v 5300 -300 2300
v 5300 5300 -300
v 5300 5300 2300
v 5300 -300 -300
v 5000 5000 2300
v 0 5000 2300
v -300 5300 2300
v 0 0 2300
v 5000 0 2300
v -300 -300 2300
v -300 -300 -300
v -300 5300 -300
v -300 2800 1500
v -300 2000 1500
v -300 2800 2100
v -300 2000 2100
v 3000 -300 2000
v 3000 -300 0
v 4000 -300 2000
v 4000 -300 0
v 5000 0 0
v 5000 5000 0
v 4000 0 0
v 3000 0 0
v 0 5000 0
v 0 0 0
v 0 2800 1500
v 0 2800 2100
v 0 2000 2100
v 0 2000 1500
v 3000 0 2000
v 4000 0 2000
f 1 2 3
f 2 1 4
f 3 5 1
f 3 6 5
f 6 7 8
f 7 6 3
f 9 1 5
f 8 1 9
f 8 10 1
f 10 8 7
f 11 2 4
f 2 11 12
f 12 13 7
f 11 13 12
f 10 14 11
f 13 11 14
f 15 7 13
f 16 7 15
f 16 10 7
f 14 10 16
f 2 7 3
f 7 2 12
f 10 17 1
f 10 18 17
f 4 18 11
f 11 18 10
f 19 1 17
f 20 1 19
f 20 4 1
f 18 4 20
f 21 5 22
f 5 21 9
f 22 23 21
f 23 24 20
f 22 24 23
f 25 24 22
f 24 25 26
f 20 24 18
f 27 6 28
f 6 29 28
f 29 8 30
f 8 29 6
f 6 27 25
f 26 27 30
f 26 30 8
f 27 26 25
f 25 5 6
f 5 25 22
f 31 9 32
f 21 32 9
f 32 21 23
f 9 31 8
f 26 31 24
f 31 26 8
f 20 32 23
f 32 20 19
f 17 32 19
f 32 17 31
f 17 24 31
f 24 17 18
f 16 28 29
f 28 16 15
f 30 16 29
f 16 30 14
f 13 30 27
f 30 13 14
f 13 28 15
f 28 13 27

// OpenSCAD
// file: table.scad
// table module

table_height    = 800;
table_width     = 1200;
table_length    = 600;
table_leg_width = 50;

// example rendering with above values
table(table_height,table_width,table_length,table_leg_width);


module table(height,
             width,
             length,
             leg_width)
{
    cutout_width    = width - 2*leg_width;
    cutout_height   = height - leg_width;
    
    difference(){
        // main frame
        cube([width, length, height]);
        
        // leg cutout
        translate([leg_width,0,0])
            cube([cutout_width, length, cutout_height]);
    }
}
// file: bed.scad
// bed module

bed_length              = 2020;
bed_width               = 1020;
bed_frame_height        = 30;

bed_leg_height          = 1520;
bed_leg_width           = 74;

bed_rim_height          = 500;
bed_rim_width           = 20;

bed_frame_bar_width     = 144;
bed_frame_bar_height    = 20;
bed_frame_bar_space     = 80;


// example render with above values
bed(bed_length,
    bed_width,
    bed_frame_height,
    bed_leg_height,
    bed_leg_width,
    bed_rim_height,
    bed_rim_width,
    bed_frame_bar_height,
    bed_frame_bar_width,
    bed_frame_bar_space
    );


module bed(length,
           width,
           frame_height,
           leg_height,
           leg_width,
           rim_height,
           rim_width,
           frame_bar_height,
           frame_bar_width,
           frame_bar_space){
               
    // calculate frame bar values
    frame_bar_length    = width;
    frame_bar_num       = floor((length - frame_bar_width)
                         /(frame_bar_width + frame_bar_space));
    
    frame_bar_space     = (((length - frame_bar_width)
                            %(frame_bar_width + frame_bar_space))
                           /frame_bar_num)
                          +frame_bar_space;
               
    // calculate leg values
    bed_leg_x   = bed_length - leg_width;
    bed_leg_y   = bed_width - leg_width;
    bed_leg_pos = [[0,0,0],
                   [bed_leg_x,0,0],
                   [bed_leg_x,bed_leg_y,0],
                   [0,bed_leg_y,0]];


    // legs
    color("red")
    for (i=bed_leg_pos){
        translate(i)
            cube([leg_width,leg_width,leg_height]);
    }

    
    // upper side cross bars
    for(i=[0,width-leg_width])
        translate([0,i,leg_height])
            cube([length,leg_width,leg_width]);

    // upper front/back crossbars
    for(i=[0,length-leg_width]){
        translate([i,leg_width,leg_height])
            cube([leg_width,width-2*leg_width,leg_width]);
    }
    
    // lower side crossbars
    translate([leg_width,width-leg_width,rim_height])
        cube([length-2*leg_width,leg_width,leg_width]);
    
    // lower front/back cross bars
    for(i=[0,length-leg_width]){
        translate([i,leg_width,rim_height])
            cube([leg_width,width-2*leg_width,leg_width]);
    }    



    // bed frame bars
    translate([0,0,leg_height+leg_width]) {
    
        // first frame bar
        cube([frame_bar_width, frame_bar_length, frame_bar_height]);
        
        
        // remaining frame bars
        for(i=[0:1:frame_bar_num]){
            translate([i*(frame_bar_width+frame_bar_space),0,0])
                cube([frame_bar_width, frame_bar_length, frame_bar_height]);
        }
    }
    
    /*color("blue")
    translate([0,0,bed_leg_height])
        cube([length,width,frame_height]);
    */ 
    // side rims
    #for(i=[-rim_width, width])
        translate([0,i,leg_height])
            cube([length,rim_width,rim_height]);
    
    // front/back rims
    #for(i=[-rim_width, length])
        translate([i,-rim_width,leg_height])
            cube([rim_width,width + 2*rim_width,rim_height]);
    
    // output materials
    echo("Legs:\t\t 4x: ", h=leg_width, w=leg_width, l=leg_height);
    echo("Upper crossbars side:\t 2x: ", h=leg_width, w=leg_width, l=length);
    echo("Lower crossbars side:\t 1x: ", h=leg_width, w=leg_width, l=length-2*leg_width);
    echo("Crossbars f/b:\t 4x: ", h=leg_width, w=leg_width, h=width-2*leg_width);
    echo();
    echo("Total length\t ", 4*leg_height
                          + 2*length
                          + length-2*leg_width
                          + 4*(width-2*leg_width));
    echo("Rims side\t 2x: ", h=rim_width, w=rim_height, l=length);
    echo("Rims front/back\t 2x: ", h=rim_width, w=rim_height, l=width + 2*rim_width);
    echo("Frame bars\t ", num=frame_bar_num + 1, h=frame_bar_height, w=frame_bar_width, l=frame_bar_length);
    echo("Frame bar space\t ",frame_bar_space);
}
// file: rack.scad
// rack module

rack_shelf_number   = 3;

// overall rack dimensions
rack_length         = 750;
rack_width          = 300;
rack_height         = 1500;

// values required to calculate shelfes
rack_bar_width      = 50;  // side bar/wall width
rack_board_height   = 50;  // height of single inlay boards
rack_floor_space    = 70; // free space below lowest board


// rendering with examples from above
rack(rack_shelf_number,
     rack_length,
     rack_width,
     rack_height,
     rack_bar_width,
     rack_board_height,
     rack_floor_space);


module rack(shelf_number,
            length,
            width,
            height,
            bar_width=50,
            board_height=50,
            floor_space=50){

    shelf_length   = length - 2 * bar_width;
    shelf_height   = (height - floor_space - board_height
                          - shelf_number * board_height)
                          / shelf_number - 1;
    shelf_offset   = shelf_height + board_height;

    difference(){
        // main frame
        cube([length,width,height]);
        
        // cutouts for shelfes
        translate([0,0,floor_space + board_height])
            for(i=[0:1:shelf_number - 1]) {
                echo(i * shelf_offset);
                translate([bar_width,0,i * shelf_offset])
                    cube([shelf_length,width,shelf_height]);
        }
    }
}
// main file
// room plan

use <rack.scad>;
use <bed.scad>;
use <table.scad>;


room_dim    = [5000,5000,2300];
wall        = 300;

door_height = 2000;
door_width  = 1000;
door_offset = 3000;

window_height   = 600;
window_width    = 800;
window_offset_z = 1500;
window_offset_x = 2000;

// room
difference(){
    translate([-wall,-wall,-wall])
        // room + walls
        cube(room_dim+[2*wall,2*wall,wall]);
    
        // room inside
        cube(room_dim);
    
        // door
        translate([door_offset,-wall,0])
            cube([door_width,wall,door_height]);
    
        // window
        translate([0,window_offset_x,window_offset_z])
            rotate([0,0,-270])        
                cube([window_width,wall,window_height]);
}
